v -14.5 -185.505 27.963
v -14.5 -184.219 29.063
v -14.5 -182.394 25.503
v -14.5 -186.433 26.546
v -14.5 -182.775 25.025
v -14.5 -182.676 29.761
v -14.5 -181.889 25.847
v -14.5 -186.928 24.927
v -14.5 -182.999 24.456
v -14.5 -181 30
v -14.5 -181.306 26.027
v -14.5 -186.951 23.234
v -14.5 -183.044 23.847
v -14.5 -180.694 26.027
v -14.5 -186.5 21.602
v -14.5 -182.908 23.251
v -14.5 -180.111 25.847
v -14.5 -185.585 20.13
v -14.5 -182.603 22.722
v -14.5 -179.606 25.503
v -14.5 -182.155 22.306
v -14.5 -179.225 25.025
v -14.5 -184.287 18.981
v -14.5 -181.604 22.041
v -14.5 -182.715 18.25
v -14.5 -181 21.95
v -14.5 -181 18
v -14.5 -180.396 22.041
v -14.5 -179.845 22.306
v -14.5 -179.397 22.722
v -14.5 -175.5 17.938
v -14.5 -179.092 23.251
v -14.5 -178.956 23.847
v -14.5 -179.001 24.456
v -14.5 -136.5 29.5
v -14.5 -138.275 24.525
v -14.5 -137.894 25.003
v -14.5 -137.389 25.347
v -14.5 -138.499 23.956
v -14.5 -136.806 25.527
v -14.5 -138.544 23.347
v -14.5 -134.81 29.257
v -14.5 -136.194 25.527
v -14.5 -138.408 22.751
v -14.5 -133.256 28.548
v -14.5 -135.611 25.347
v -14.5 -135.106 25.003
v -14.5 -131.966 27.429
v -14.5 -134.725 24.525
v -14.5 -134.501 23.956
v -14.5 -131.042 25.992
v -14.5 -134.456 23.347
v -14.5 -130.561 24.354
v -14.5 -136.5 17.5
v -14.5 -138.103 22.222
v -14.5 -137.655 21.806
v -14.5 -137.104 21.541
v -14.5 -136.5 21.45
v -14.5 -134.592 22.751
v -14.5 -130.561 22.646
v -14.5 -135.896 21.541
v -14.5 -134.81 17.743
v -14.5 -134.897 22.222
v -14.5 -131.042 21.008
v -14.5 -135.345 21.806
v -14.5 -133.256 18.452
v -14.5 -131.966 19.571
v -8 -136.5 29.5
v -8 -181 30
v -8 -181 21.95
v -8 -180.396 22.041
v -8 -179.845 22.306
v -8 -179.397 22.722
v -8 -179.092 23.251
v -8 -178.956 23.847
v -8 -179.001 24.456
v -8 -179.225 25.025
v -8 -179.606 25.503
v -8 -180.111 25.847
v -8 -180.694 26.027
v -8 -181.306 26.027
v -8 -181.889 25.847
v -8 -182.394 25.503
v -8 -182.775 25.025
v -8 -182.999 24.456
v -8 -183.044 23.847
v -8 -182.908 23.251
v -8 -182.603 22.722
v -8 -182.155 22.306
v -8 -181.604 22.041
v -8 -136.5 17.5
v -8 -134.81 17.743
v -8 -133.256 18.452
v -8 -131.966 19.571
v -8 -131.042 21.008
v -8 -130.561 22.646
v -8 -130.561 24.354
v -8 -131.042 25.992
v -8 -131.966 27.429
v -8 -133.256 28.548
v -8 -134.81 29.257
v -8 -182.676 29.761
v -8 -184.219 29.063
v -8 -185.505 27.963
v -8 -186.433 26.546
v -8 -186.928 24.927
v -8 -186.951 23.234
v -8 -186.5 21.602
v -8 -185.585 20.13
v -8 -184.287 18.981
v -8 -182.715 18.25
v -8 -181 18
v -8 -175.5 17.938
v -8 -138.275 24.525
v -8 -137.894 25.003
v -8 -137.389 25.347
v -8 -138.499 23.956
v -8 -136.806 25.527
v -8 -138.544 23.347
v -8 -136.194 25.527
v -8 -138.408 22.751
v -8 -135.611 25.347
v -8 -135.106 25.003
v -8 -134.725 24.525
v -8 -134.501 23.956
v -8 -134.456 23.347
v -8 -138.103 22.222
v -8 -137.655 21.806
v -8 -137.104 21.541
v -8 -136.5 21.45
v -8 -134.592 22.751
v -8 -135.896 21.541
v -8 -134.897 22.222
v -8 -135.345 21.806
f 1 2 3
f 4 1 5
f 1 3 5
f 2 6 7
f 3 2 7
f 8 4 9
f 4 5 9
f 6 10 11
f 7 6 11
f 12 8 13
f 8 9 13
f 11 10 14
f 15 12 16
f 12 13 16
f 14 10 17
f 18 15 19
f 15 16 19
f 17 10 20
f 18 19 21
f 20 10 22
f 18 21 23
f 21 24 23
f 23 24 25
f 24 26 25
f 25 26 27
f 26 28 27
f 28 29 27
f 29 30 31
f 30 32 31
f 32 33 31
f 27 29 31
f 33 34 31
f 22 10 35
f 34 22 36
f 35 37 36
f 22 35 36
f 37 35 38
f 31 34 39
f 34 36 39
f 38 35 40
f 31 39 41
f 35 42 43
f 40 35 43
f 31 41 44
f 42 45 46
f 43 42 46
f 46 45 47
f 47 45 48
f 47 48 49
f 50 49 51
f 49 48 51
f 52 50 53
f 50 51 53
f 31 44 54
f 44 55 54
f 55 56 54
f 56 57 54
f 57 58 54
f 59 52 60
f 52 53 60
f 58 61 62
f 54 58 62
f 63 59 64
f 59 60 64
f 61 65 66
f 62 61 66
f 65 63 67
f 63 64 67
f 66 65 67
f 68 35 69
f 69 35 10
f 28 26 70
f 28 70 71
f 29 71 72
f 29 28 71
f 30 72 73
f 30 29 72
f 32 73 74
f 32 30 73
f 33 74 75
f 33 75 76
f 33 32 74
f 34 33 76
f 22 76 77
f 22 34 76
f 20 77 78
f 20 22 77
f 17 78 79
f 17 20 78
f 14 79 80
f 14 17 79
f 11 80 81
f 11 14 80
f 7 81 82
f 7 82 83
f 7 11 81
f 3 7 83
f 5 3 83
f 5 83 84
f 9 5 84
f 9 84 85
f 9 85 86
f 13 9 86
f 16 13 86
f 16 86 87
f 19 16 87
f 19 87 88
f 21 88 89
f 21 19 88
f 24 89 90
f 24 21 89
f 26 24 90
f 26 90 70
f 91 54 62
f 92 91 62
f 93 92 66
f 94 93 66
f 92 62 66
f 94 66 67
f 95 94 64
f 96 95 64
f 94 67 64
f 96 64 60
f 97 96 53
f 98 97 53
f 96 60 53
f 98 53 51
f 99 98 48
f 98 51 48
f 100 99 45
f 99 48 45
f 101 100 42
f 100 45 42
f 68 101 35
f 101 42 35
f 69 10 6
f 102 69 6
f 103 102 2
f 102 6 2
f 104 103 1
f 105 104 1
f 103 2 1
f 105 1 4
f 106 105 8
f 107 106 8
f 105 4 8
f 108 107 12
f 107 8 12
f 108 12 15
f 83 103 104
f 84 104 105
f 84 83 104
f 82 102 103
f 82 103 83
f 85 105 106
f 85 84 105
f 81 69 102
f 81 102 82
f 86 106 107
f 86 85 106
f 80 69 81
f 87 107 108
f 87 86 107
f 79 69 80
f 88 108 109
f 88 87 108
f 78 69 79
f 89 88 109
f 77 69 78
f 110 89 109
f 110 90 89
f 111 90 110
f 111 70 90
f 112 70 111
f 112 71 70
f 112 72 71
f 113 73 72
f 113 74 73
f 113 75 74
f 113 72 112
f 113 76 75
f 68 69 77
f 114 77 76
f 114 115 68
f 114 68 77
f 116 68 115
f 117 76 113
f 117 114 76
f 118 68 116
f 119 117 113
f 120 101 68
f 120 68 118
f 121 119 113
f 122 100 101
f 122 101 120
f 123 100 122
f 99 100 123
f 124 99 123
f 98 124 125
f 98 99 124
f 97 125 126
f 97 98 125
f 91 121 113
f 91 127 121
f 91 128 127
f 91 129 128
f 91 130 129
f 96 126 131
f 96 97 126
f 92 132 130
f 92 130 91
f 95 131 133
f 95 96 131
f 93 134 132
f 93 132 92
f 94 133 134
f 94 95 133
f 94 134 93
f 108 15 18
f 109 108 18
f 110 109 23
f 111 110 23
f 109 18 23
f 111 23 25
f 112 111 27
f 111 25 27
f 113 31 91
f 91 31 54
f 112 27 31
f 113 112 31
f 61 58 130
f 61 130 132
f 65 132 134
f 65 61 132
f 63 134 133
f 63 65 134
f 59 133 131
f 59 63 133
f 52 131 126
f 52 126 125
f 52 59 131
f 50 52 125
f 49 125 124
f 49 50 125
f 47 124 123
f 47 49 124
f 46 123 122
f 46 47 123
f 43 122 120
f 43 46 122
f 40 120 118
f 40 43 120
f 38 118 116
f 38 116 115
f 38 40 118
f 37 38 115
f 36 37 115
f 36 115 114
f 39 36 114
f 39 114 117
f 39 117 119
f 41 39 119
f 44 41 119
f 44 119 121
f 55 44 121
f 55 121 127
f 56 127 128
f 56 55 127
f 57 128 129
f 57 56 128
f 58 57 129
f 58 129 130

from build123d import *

# Parameters (mm, degrees)
SKETCH1_R           = 2.05
BOSS_EXTRUDE1_DEPTH = 6.5


with BuildPart() as part:
    # Sketch1 → Boss-Extrude1 (new body)
    with BuildSketch(Plane(origin=(-14.5, 0, 0), x_dir=(0, 0, -1), z_dir=(1, 0, 0))):
        with BuildLine():
            ThreePointArc((-17.5, -136.5), (-23.5, -130.5), (-29.5, -136.5))
            Line((-29.5, -136.5), (-30, -181))
            ThreePointArc((-30, -181), (-27.287286528, -186.019337335), (-21.602084238, -186.5))
            Line((-21.602084238, -186.5), (-24, -186.5))
            ThreePointArc((-24, -186.5), (-29.5, -181), (-24, -175.5))
            Line((-24, -175.5), (-17.938202247, -175.5))
            Line((-17.938202247, -175.5), (-17.5, -136.5))
        make_face()
        with Locations((-23.5, -136.5)):
            Circle(SKETCH1_R, mode=Mode.SUBTRACT)
        with BuildLine():
            Line((-24, -186.5), (-21.602084238, -186.5))
            ThreePointArc((-21.602084238, -186.5), (-18.980662665, -184.287286528), (-18, -181))
            Line((-18, -181), (-17.938202247, -175.5))
            Line((-17.938202247, -175.5), (-24, -175.5))
            ThreePointArc((-24, -175.5), (-29.5, -181), (-24, -186.5))
        make_face()
        with Locations((-24, -181)):
            Circle(SKETCH1_R, mode=Mode.SUBTRACT)
    extrude(amount=BOSS_EXTRUDE1_DEPTH)


solid = part.part
